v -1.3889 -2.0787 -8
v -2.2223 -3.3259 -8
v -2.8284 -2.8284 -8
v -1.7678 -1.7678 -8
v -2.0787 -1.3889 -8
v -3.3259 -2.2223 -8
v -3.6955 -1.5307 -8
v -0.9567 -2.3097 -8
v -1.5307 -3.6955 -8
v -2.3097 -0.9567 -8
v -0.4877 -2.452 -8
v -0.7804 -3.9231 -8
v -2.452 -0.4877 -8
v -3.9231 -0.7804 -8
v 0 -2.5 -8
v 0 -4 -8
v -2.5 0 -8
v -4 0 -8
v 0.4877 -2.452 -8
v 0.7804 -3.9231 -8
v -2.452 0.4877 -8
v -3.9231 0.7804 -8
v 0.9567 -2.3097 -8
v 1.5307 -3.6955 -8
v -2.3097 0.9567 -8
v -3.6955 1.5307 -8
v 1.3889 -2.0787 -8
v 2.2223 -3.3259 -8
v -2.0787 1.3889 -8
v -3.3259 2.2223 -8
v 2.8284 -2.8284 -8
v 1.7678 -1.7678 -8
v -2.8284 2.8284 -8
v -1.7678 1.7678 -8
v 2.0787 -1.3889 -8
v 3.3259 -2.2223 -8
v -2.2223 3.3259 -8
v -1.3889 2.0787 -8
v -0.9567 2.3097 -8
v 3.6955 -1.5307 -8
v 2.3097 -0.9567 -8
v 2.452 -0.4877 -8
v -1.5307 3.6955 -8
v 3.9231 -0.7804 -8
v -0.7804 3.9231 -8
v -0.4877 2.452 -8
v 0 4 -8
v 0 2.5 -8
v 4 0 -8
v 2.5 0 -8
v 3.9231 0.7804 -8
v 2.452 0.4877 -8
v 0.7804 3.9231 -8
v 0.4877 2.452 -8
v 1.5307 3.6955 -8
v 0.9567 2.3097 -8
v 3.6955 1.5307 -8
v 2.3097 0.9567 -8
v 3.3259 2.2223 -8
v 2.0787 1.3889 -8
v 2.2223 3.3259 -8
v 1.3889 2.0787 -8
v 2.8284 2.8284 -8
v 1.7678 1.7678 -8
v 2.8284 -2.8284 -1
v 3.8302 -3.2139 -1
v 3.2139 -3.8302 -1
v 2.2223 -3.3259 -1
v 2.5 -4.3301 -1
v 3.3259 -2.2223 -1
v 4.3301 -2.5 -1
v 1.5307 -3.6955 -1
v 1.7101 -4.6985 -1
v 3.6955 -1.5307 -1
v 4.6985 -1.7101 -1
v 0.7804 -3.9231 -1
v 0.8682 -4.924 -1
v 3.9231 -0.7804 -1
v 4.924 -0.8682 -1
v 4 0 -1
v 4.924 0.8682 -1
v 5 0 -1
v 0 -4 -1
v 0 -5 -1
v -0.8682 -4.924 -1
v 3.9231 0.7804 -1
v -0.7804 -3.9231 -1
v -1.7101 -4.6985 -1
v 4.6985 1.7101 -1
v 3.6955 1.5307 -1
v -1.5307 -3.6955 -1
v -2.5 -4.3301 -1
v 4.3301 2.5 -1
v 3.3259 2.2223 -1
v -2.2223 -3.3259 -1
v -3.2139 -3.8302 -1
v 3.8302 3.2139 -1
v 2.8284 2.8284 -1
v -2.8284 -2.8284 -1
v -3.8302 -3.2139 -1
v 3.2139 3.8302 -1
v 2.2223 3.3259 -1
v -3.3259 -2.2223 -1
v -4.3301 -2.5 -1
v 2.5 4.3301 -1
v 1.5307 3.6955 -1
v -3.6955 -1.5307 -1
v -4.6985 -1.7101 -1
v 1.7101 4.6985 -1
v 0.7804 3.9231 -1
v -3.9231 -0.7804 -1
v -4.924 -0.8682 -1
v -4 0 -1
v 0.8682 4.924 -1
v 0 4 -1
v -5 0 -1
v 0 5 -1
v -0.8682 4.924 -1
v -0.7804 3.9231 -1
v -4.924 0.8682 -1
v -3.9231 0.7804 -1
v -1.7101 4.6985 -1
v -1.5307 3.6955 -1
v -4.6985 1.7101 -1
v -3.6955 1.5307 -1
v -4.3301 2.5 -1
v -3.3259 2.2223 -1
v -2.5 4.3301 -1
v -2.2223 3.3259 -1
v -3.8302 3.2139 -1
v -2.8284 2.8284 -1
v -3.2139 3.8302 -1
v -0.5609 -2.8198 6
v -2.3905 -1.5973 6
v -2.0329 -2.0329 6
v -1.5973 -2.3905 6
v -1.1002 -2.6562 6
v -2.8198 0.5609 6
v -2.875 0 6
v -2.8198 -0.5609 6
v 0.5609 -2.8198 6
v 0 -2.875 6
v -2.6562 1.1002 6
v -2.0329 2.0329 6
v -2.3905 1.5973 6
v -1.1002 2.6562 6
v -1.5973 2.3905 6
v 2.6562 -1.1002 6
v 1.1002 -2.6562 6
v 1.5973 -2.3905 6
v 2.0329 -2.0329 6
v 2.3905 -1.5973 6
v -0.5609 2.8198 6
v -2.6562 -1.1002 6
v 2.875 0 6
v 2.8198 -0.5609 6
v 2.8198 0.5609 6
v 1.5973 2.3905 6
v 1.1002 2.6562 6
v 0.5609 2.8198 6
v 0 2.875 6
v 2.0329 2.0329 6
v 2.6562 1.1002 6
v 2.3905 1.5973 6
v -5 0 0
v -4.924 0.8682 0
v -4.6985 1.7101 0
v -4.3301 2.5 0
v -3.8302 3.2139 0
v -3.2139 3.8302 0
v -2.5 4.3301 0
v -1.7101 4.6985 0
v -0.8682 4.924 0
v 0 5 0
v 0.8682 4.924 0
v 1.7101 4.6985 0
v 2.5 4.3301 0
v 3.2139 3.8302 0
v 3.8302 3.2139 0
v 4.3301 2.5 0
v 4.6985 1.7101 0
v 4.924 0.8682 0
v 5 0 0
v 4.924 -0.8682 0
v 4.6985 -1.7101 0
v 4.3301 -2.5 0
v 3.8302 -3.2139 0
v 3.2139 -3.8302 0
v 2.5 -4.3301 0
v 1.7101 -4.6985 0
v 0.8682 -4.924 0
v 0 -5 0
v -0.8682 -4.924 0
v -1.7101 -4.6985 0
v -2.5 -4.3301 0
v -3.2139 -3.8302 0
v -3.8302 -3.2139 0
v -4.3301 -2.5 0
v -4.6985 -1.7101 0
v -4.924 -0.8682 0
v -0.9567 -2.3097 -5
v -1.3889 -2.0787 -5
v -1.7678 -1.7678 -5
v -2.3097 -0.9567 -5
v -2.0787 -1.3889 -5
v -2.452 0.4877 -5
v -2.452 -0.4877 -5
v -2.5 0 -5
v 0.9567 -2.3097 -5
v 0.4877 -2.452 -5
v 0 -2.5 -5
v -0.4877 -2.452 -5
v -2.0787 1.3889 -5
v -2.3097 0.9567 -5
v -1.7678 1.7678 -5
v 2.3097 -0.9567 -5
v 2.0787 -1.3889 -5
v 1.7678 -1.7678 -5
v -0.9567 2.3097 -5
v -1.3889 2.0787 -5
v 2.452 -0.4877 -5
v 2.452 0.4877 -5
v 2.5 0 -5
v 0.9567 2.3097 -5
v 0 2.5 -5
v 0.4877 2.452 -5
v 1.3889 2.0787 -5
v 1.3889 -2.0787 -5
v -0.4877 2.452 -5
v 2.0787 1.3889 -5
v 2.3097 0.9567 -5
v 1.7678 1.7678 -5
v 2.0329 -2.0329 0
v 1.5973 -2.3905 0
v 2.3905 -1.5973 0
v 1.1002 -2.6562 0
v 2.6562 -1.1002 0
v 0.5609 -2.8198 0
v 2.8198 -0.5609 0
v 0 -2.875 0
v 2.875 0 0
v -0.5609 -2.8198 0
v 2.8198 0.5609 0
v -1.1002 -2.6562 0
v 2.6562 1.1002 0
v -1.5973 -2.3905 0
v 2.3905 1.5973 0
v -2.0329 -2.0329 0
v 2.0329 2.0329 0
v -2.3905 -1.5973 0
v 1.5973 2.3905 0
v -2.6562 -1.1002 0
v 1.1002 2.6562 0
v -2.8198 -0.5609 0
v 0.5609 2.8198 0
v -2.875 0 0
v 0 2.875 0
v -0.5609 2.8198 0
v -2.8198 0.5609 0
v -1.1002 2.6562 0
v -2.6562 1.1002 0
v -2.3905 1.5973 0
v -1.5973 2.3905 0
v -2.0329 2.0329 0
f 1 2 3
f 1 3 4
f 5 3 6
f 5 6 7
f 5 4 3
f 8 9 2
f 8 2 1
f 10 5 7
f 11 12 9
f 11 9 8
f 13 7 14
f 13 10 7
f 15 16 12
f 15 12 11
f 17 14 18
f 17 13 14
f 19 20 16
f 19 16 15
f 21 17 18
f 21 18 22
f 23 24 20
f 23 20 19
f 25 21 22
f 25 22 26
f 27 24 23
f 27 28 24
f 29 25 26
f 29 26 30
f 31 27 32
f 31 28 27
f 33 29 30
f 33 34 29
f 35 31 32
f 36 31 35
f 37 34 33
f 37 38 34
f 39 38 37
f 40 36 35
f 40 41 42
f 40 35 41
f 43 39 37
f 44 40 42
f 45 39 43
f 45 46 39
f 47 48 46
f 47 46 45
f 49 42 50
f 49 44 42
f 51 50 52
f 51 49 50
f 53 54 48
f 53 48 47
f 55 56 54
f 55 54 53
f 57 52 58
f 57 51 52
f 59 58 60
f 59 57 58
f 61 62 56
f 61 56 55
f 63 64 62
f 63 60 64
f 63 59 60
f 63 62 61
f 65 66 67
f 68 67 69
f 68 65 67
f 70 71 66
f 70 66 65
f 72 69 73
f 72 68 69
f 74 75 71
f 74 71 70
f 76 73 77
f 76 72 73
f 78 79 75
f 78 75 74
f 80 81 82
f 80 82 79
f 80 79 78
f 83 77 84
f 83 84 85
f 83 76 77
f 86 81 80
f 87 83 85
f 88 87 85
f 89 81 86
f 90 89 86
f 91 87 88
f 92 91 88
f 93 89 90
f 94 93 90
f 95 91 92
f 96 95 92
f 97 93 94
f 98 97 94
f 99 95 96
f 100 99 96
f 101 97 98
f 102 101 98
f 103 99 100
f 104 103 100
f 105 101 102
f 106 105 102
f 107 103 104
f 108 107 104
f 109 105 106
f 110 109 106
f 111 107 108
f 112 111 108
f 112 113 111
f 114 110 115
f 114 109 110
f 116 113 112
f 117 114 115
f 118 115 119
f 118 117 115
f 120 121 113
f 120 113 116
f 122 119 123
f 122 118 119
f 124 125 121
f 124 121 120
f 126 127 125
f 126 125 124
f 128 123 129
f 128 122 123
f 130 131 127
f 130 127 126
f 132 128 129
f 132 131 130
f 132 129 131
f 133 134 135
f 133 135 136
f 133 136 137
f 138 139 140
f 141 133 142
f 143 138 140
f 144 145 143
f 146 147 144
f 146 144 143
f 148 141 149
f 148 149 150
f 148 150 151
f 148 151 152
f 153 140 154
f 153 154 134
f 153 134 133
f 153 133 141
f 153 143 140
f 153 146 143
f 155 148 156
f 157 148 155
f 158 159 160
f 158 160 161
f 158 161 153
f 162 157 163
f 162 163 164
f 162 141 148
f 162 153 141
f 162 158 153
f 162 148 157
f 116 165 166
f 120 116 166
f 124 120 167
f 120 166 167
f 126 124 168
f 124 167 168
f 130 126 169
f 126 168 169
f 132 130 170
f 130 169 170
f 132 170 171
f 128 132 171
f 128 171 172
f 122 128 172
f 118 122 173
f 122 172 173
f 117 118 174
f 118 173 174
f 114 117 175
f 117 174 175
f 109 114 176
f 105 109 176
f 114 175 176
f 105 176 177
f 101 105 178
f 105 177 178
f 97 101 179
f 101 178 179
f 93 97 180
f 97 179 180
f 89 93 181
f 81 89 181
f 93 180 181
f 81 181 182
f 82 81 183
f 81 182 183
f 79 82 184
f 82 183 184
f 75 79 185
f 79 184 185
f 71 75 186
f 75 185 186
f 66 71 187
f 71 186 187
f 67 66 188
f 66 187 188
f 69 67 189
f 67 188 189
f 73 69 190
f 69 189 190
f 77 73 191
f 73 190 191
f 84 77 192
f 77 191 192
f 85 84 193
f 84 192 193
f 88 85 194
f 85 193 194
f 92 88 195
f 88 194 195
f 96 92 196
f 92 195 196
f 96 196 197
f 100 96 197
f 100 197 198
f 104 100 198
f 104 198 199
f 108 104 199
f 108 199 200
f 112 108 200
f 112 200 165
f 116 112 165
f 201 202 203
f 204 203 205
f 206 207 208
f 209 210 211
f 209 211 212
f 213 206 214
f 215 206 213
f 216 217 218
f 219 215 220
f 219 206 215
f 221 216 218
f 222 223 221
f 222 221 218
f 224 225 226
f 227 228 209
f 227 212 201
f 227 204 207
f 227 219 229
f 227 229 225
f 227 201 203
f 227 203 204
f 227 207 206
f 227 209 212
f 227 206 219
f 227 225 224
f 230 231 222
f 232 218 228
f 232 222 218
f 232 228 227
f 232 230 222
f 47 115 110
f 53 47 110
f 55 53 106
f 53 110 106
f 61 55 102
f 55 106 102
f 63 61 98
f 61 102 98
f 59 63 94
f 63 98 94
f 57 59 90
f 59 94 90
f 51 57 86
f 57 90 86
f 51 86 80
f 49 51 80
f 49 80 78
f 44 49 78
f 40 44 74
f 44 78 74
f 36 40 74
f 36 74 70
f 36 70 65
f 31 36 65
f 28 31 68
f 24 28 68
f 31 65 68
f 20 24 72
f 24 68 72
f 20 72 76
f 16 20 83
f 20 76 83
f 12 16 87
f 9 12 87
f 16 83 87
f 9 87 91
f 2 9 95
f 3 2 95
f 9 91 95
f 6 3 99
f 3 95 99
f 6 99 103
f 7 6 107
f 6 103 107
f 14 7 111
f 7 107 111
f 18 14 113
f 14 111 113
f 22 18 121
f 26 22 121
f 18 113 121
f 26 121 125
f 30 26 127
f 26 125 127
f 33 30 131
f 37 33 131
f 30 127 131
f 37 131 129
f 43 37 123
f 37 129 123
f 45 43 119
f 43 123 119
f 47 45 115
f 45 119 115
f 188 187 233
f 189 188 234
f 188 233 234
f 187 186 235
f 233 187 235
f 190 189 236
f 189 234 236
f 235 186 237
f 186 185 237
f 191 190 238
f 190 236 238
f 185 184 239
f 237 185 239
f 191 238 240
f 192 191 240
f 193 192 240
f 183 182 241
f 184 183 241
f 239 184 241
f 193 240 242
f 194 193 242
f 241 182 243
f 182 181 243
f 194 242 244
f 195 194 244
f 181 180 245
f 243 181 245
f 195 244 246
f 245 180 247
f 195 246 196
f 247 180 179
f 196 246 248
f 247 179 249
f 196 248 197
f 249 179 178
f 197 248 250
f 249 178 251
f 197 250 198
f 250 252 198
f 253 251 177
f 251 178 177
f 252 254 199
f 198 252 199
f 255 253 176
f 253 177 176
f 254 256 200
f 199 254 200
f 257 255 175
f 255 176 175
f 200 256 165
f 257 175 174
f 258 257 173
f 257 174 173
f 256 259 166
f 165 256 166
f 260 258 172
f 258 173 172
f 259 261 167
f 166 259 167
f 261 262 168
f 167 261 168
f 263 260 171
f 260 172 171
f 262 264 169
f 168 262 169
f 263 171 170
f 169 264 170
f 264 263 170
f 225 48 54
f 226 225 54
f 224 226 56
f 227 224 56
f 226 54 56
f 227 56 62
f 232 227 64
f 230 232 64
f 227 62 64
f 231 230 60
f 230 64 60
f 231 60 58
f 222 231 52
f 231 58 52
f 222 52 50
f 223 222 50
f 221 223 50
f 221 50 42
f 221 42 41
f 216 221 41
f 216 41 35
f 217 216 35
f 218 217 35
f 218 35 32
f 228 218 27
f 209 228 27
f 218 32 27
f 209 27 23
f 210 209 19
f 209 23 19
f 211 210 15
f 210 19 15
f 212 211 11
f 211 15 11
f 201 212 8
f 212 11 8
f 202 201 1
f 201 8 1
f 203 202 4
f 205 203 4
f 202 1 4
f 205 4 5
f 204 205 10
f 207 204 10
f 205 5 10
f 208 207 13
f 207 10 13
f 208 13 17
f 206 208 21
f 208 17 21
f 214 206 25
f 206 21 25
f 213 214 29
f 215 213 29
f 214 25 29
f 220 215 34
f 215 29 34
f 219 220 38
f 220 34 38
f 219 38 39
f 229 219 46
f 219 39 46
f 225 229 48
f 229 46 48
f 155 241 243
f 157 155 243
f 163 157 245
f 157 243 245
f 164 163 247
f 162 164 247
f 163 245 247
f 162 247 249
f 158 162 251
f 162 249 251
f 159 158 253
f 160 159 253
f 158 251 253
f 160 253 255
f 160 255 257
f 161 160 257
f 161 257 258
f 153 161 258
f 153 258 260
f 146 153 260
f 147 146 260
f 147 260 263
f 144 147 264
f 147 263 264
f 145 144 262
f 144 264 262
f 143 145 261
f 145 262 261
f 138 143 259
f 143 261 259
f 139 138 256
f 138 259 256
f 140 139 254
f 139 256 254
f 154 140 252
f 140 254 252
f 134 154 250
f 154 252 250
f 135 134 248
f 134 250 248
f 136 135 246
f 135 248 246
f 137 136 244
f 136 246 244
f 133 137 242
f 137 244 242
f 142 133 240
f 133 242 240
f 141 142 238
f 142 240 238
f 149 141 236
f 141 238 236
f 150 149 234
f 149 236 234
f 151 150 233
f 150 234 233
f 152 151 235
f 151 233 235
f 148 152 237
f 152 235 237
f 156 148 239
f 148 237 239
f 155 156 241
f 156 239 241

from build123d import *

# Parameters (mm, degrees)
SKETCH13_R          = 5
BOSS_EXTRUDE5_DEPTH = 1
SKETCH14_R          = 4
BOSS_EXTRUDE6_DEPTH = 7
SKETCH15_R          = 2.5
CUT_EXTRUDE5_DEPTH  = 3
SKETCH16_R          = 2.875
BOSS_EXTRUDE7_DEPTH = 6


with BuildPart() as part:
    # Sketch13 → Boss-Extrude5 (new body)
    with BuildSketch(Plane(origin=(0, 5, 0), x_dir=(1, 0, 0), z_dir=(0, 0, -1))):
        with Locations(Location((0, 5, 0), (0, 0, 180))):
            Circle(SKETCH13_R)
    extrude(amount=BOSS_EXTRUDE5_DEPTH)

    # Sketch14 → Boss-Extrude6 (add)
    with BuildSketch(Plane(origin=(0, 0, -1), x_dir=(1, 0, 0), z_dir=(0, 0, -1))):
        with Locations(Location((0, 0, 0), (0, 0, 270))):
            Circle(SKETCH14_R)
    extrude(amount=BOSS_EXTRUDE6_DEPTH)

    # Sketch15 → Cut-Extrude5 (cut)
    with BuildSketch(Plane(origin=(0, 0, -8), x_dir=(1, 0, 0), z_dir=(0, 0, -1))):
        with Locations(Location((0, 0, 0), (0, 0, 270))):
            Circle(SKETCH15_R)
    extrude(amount=-CUT_EXTRUDE5_DEPTH, mode=Mode.SUBTRACT)

    # Sketch16 → Boss-Extrude7 (add)
    with BuildSketch(Plane.XY):
        Circle(SKETCH16_R)
    extrude(amount=BOSS_EXTRUDE7_DEPTH)


solid = part.part
